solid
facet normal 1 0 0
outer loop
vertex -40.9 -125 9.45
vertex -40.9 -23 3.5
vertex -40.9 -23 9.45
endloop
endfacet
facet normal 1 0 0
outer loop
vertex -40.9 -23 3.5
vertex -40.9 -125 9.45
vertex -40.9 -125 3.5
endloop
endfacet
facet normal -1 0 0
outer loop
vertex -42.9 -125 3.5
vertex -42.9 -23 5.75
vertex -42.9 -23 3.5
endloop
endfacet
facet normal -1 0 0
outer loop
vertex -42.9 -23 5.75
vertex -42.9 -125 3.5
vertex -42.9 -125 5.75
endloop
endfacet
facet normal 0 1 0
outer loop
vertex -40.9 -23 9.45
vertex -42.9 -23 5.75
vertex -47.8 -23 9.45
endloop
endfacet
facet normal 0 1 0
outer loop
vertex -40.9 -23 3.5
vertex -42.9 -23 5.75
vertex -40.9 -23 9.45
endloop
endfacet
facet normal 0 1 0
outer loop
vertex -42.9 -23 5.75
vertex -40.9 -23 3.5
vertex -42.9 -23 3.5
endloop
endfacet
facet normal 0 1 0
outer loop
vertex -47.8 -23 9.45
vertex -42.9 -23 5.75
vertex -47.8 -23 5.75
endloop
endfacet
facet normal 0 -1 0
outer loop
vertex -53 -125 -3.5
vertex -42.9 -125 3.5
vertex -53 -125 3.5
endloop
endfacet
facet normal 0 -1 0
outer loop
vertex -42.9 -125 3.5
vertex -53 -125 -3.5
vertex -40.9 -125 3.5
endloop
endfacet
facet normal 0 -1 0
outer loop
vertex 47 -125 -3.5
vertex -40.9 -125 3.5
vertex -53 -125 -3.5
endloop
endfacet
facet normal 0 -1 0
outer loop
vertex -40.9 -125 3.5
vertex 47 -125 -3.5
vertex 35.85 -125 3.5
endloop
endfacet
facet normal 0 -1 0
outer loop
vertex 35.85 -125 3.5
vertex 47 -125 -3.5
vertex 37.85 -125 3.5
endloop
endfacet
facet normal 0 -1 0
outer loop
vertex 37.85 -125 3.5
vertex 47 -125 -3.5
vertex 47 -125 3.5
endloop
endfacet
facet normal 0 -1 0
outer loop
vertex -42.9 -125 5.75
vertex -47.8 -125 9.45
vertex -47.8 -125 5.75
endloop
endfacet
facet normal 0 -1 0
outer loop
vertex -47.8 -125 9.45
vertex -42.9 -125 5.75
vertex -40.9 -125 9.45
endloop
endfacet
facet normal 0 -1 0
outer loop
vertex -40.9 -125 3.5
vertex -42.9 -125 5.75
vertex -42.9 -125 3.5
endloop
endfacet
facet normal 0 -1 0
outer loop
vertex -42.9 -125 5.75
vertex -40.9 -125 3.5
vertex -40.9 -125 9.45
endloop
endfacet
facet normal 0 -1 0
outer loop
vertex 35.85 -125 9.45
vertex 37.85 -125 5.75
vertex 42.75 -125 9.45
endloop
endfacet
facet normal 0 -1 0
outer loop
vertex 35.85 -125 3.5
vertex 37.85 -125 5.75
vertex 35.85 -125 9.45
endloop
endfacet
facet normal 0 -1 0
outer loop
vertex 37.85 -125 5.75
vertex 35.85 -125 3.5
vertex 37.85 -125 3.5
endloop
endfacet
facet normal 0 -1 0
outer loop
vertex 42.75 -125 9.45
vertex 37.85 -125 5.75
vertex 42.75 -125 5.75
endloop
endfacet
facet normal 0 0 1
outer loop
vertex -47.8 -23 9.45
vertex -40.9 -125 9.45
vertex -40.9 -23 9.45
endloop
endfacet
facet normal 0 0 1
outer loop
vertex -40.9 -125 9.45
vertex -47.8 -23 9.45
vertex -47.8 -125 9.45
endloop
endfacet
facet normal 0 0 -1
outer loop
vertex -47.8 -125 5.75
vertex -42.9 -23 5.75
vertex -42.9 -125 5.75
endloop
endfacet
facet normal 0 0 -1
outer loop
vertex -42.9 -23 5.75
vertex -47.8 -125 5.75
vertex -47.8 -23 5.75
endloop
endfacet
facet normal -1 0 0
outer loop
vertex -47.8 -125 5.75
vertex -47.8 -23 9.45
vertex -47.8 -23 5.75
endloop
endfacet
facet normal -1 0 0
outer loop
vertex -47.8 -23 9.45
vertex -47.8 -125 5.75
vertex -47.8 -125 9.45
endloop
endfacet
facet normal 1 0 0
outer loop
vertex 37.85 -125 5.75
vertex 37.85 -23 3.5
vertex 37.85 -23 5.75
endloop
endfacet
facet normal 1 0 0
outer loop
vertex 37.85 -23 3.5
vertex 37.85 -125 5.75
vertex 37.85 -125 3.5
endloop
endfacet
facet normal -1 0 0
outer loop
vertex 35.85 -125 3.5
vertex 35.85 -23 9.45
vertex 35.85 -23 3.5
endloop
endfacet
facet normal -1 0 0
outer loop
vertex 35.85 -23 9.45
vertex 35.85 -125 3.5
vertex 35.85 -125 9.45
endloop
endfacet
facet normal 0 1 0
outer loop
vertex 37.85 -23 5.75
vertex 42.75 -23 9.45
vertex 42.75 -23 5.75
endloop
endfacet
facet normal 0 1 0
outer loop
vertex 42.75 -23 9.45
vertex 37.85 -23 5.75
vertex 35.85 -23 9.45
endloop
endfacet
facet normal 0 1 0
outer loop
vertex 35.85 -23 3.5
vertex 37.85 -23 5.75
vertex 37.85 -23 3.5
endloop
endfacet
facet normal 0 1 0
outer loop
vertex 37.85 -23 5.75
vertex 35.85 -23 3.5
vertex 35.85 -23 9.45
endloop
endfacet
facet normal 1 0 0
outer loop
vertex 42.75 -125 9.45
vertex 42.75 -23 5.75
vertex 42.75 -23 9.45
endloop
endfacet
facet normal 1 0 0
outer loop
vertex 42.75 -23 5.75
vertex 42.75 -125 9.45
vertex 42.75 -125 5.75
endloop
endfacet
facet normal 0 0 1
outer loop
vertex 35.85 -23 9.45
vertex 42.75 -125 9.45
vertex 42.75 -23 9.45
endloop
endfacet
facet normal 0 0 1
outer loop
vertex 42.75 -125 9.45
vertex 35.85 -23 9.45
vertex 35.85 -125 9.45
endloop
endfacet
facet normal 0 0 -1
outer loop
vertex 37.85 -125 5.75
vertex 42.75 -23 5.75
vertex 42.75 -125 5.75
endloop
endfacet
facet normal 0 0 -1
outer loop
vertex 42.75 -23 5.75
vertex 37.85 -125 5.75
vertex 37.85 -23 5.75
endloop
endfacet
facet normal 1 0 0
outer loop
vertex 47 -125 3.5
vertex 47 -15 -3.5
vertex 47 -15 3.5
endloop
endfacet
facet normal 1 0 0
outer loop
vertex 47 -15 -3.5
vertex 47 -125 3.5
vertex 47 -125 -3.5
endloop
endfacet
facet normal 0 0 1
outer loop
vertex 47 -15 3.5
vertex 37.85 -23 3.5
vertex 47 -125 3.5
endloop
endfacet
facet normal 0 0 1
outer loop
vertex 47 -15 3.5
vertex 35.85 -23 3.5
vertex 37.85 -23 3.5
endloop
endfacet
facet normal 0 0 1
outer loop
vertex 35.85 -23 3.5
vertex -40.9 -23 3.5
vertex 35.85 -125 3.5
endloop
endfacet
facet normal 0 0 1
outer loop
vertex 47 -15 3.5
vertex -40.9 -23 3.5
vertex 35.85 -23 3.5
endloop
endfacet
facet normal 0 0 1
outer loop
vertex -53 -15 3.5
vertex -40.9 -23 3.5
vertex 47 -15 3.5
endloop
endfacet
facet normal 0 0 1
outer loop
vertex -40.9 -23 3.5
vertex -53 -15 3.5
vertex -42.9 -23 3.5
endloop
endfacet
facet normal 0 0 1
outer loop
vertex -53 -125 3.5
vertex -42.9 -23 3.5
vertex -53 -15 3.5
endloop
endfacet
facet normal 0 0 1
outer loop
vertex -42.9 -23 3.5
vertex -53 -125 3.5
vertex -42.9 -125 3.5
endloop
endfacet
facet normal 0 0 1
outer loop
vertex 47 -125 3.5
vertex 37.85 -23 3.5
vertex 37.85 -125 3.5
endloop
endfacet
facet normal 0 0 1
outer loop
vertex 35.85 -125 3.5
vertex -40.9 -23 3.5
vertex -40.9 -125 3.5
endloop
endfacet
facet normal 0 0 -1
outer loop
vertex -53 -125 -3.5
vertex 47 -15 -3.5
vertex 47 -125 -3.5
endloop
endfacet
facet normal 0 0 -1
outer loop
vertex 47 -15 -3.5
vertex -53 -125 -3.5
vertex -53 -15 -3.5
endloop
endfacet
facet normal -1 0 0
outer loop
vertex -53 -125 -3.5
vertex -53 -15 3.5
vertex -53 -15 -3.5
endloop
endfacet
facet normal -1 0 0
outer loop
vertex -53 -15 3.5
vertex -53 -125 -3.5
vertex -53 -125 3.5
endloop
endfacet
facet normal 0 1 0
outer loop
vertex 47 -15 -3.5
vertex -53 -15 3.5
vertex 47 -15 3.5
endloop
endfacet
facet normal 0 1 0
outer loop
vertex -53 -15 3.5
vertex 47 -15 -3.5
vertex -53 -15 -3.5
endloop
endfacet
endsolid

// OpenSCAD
// file: ../robot_settings.scad
main_box_x = 95; // 96
main_box_y = 102;
main_box_z = 74; // 74.5
wall_thickness = 2;

rail_gap = 2;
rail_inset = 7;

rail_thickness = 7;
rail_length = 250;
rail_width = 200;

raspberry_pi_screw_seperation_y = 57;
raspberry_pi_screw_seperation_z = 48;
raspberry_pi_peg_h = 5;

battery_box_peg_h = 6;
battery_box_peg_d = 8;
battery_box_peg_cutout = 5;

gears_module = 1;
pinion_gear_teeth = 32;
pinion_gear_width = 5;
pinion_gear_bore = 8;

gears_setback_distance = 25;
gear_post_height = 2 * pinion_gear_width + rail_thickness + 8 ;

steering_motor_mount_x = 45;
steering_motor_mount_y = 36;
steering_motor_mount_z = 18;
steering_motor_mount_setback_distance = gears_setback_distance + 16;

dc_motor_drivertype = "Teyleten"; // Teyleten
isAdafruit = (dc_motor_drivertype == "Adafruit");

drv8871_x = isAdafruit ? 20.3 : 21.6;
drv8871_y = isAdafruit ?  24 : 25;

drv8871_z = 2;
drv8871_screw_d = 2.5;
drv8871_solder_points_z = 2;

drv8871mount_edge_x = 1.5;
drv8871mount_edge_wall = 3;
drv8871mount_z = 5;
drv8871mount_x = drv8871_x +  drv8871mount_edge_wall - 2* drv8871mount_edge_x;
drv8871mount_y = 19;

drv8871_screw_distance = 15.64;
drv8871_solder_points_d = 1.66;
drv8871_solder_offset_y = 4.4;
drv8871_solder_inner_points_distance = 5;
drv8871_solder_outer_points_distance = 12;

dc_motor_housing_minus_encoder_z = 48;
dc_motor_encoder_z = 9.33;
dc_motor_encoder_wheel_d = 13.4;
dc_motor_encoder_wheel_thickness = 5;
dc_motor_encoder_wheel_gap = 3;
dc_motor_encoder_circuit_thickness = 2;
dc_motor_cutout_d = 24.8;
dc_motor_cutout_z = 19.5;

dc_motor_screw_head_z = 2;
dc_motor_screw_head_d = 5.6;
dc_motor_screw_d = 3.2;
dc_motor_screw_offset = 8.5;

dc_motor_axle_ring_z = 3;
dc_motor_axle_ring_d = 7.2;
dc_motor_axle_cutout_d = 4.5;
dc_motor_axle_cutout_z = 10;
dc_motor_axle_notch_cutout = 0.4;
dc_motor_axle_notch_cutout_z = 6;

pdmount_x = 20;
pdmount_y = 30;
pdmount_z = 2;
pdmount_edge_x = 1.5;
pdmount_edge_wall = 3;

steering_shaft_z = 45;
steering_shaft_d = 7;
steering_shaft_motor_fitting_d = 9;
coupler_length = 24.6;
coupler_diameter = 14;
coupler_screw_d = 4;
coupler_screw_z_offset = 5;
coupler_gear_side_insert = 12.6;
steering_shaft_with_coupler_z = steering_shaft_z - coupler_gear_side_insert;

lidar_mount_y = 110;
lidar_mount_x = 65 + 20;
lidar_narrow_screws = 40;
lidar_wide_screws = 56;
lidar_front_to_back_screws = 70;
lidar_screw_d = 3;
lidar_circuitboard_x = 20;
lidar_circuitboard_y = 35;
lidar_circuitboard_z = 1.2;
lidar_cord_length = 29;

ball_bearing_height = 7;
ball_bearing_outer_diameter = 22;
ball_bearing_inner_diameter = 8;

 armature_holder_height = 20;
 armature_holder_thickness = 8;
pull_bar_peg_r = 3.2;
apparatus_locking_peg_d = 4;

rack_module = 1;
rack_length = main_box_x / 2;
rack_height = 10;
rack_width = 10;
rack_teeth = 30;
rack_bore = 3;

pull_bar_length = rail_width / 2 - rack_length + 1;

// tire hardware
axle_length = 30;
axle_reciever_inner_diameter = 7.75;
axle_reciever_length = 18.8;
axle_notch_length = 7;
axle_notch_cutout = 2.4;

// power distribution bar
power_bar_cutout_x = 96;
power_bar_y = 19.1;
power_bar_z = 1.5;
power_bar_screw_distance = 91.4;
power_bar_screw_d = 2.8;
power_bar_standoff_z = 5;
power_bar_standoff_d = 6.83;

// breadboard
breadboard_wall_thickness = 3;
breadboard_width = 55;
breadboard_length = 83;
breadboard_height = 10.5;
breadboard_notch_width = 4.2;
breadboard_longside_notch_separation = 58.2 - breadboard_notch_width / 2;
breadboard_shortside_notch_separation = 26.3 - breadboard_notch_width;

pico_expander_width = 63;
pico_expander_height = 57;
pico_screw_hole_offset = 3;
pico_screw_hole_d = 2.5;

usbhub_thickness = 11.7;
usbhub_depth = 37.5;
usbhub_width = 86.7;
usbhub_end_port_width = 14.8;
usbhub_end_port_height = 12;
usbhub_front_face_safe_zone_left = 15;
usbhub_front_face_safe_zone_right = 14.8;

switch_w = 16;
switch_cutout_d = 12.2;
switch_bump_h = 2;
switch_bump_l = 18.2;
// main file
  include <../robot_settings.scad>
$fn = 50;
 
 translate([-3, -70, 0])
 cube([100, 110, rail_thickness], center = true);
   // rail attachments
    difference() {
      union() {
        translate([0,  -rail_length / 2, rail_thickness / 2 - .95]) {
            translate([-main_box_x / 2 + rail_inset - 2.9, 0, 0]) {
              color("blue")
              translate([ .5, 0, 0]) 
              cube([rail_gap, main_box_y, rail_inset - 1.7]);
              
              color("red")
              translate([-4.4, -0, rail_inset - rail_gap - 1.8])
              cube([rail_inset - .1, main_box_y, rail_gap + 1.7]);
            }

          //color("yellow")
            translate([main_box_x / 2 - rail_inset - 4.65, 0, 0]) {
              color("blue")
              translate([0, 0, 0])
              cube([rail_gap, main_box_y, rail_inset - 1.7]);
              
              color("yellow")
              translate([0 , 0, rail_inset - rail_gap - 1.8])
              cube([rail_inset - .1, main_box_y, rail_gap + 1.7]);
              }
          }
      }
    }
